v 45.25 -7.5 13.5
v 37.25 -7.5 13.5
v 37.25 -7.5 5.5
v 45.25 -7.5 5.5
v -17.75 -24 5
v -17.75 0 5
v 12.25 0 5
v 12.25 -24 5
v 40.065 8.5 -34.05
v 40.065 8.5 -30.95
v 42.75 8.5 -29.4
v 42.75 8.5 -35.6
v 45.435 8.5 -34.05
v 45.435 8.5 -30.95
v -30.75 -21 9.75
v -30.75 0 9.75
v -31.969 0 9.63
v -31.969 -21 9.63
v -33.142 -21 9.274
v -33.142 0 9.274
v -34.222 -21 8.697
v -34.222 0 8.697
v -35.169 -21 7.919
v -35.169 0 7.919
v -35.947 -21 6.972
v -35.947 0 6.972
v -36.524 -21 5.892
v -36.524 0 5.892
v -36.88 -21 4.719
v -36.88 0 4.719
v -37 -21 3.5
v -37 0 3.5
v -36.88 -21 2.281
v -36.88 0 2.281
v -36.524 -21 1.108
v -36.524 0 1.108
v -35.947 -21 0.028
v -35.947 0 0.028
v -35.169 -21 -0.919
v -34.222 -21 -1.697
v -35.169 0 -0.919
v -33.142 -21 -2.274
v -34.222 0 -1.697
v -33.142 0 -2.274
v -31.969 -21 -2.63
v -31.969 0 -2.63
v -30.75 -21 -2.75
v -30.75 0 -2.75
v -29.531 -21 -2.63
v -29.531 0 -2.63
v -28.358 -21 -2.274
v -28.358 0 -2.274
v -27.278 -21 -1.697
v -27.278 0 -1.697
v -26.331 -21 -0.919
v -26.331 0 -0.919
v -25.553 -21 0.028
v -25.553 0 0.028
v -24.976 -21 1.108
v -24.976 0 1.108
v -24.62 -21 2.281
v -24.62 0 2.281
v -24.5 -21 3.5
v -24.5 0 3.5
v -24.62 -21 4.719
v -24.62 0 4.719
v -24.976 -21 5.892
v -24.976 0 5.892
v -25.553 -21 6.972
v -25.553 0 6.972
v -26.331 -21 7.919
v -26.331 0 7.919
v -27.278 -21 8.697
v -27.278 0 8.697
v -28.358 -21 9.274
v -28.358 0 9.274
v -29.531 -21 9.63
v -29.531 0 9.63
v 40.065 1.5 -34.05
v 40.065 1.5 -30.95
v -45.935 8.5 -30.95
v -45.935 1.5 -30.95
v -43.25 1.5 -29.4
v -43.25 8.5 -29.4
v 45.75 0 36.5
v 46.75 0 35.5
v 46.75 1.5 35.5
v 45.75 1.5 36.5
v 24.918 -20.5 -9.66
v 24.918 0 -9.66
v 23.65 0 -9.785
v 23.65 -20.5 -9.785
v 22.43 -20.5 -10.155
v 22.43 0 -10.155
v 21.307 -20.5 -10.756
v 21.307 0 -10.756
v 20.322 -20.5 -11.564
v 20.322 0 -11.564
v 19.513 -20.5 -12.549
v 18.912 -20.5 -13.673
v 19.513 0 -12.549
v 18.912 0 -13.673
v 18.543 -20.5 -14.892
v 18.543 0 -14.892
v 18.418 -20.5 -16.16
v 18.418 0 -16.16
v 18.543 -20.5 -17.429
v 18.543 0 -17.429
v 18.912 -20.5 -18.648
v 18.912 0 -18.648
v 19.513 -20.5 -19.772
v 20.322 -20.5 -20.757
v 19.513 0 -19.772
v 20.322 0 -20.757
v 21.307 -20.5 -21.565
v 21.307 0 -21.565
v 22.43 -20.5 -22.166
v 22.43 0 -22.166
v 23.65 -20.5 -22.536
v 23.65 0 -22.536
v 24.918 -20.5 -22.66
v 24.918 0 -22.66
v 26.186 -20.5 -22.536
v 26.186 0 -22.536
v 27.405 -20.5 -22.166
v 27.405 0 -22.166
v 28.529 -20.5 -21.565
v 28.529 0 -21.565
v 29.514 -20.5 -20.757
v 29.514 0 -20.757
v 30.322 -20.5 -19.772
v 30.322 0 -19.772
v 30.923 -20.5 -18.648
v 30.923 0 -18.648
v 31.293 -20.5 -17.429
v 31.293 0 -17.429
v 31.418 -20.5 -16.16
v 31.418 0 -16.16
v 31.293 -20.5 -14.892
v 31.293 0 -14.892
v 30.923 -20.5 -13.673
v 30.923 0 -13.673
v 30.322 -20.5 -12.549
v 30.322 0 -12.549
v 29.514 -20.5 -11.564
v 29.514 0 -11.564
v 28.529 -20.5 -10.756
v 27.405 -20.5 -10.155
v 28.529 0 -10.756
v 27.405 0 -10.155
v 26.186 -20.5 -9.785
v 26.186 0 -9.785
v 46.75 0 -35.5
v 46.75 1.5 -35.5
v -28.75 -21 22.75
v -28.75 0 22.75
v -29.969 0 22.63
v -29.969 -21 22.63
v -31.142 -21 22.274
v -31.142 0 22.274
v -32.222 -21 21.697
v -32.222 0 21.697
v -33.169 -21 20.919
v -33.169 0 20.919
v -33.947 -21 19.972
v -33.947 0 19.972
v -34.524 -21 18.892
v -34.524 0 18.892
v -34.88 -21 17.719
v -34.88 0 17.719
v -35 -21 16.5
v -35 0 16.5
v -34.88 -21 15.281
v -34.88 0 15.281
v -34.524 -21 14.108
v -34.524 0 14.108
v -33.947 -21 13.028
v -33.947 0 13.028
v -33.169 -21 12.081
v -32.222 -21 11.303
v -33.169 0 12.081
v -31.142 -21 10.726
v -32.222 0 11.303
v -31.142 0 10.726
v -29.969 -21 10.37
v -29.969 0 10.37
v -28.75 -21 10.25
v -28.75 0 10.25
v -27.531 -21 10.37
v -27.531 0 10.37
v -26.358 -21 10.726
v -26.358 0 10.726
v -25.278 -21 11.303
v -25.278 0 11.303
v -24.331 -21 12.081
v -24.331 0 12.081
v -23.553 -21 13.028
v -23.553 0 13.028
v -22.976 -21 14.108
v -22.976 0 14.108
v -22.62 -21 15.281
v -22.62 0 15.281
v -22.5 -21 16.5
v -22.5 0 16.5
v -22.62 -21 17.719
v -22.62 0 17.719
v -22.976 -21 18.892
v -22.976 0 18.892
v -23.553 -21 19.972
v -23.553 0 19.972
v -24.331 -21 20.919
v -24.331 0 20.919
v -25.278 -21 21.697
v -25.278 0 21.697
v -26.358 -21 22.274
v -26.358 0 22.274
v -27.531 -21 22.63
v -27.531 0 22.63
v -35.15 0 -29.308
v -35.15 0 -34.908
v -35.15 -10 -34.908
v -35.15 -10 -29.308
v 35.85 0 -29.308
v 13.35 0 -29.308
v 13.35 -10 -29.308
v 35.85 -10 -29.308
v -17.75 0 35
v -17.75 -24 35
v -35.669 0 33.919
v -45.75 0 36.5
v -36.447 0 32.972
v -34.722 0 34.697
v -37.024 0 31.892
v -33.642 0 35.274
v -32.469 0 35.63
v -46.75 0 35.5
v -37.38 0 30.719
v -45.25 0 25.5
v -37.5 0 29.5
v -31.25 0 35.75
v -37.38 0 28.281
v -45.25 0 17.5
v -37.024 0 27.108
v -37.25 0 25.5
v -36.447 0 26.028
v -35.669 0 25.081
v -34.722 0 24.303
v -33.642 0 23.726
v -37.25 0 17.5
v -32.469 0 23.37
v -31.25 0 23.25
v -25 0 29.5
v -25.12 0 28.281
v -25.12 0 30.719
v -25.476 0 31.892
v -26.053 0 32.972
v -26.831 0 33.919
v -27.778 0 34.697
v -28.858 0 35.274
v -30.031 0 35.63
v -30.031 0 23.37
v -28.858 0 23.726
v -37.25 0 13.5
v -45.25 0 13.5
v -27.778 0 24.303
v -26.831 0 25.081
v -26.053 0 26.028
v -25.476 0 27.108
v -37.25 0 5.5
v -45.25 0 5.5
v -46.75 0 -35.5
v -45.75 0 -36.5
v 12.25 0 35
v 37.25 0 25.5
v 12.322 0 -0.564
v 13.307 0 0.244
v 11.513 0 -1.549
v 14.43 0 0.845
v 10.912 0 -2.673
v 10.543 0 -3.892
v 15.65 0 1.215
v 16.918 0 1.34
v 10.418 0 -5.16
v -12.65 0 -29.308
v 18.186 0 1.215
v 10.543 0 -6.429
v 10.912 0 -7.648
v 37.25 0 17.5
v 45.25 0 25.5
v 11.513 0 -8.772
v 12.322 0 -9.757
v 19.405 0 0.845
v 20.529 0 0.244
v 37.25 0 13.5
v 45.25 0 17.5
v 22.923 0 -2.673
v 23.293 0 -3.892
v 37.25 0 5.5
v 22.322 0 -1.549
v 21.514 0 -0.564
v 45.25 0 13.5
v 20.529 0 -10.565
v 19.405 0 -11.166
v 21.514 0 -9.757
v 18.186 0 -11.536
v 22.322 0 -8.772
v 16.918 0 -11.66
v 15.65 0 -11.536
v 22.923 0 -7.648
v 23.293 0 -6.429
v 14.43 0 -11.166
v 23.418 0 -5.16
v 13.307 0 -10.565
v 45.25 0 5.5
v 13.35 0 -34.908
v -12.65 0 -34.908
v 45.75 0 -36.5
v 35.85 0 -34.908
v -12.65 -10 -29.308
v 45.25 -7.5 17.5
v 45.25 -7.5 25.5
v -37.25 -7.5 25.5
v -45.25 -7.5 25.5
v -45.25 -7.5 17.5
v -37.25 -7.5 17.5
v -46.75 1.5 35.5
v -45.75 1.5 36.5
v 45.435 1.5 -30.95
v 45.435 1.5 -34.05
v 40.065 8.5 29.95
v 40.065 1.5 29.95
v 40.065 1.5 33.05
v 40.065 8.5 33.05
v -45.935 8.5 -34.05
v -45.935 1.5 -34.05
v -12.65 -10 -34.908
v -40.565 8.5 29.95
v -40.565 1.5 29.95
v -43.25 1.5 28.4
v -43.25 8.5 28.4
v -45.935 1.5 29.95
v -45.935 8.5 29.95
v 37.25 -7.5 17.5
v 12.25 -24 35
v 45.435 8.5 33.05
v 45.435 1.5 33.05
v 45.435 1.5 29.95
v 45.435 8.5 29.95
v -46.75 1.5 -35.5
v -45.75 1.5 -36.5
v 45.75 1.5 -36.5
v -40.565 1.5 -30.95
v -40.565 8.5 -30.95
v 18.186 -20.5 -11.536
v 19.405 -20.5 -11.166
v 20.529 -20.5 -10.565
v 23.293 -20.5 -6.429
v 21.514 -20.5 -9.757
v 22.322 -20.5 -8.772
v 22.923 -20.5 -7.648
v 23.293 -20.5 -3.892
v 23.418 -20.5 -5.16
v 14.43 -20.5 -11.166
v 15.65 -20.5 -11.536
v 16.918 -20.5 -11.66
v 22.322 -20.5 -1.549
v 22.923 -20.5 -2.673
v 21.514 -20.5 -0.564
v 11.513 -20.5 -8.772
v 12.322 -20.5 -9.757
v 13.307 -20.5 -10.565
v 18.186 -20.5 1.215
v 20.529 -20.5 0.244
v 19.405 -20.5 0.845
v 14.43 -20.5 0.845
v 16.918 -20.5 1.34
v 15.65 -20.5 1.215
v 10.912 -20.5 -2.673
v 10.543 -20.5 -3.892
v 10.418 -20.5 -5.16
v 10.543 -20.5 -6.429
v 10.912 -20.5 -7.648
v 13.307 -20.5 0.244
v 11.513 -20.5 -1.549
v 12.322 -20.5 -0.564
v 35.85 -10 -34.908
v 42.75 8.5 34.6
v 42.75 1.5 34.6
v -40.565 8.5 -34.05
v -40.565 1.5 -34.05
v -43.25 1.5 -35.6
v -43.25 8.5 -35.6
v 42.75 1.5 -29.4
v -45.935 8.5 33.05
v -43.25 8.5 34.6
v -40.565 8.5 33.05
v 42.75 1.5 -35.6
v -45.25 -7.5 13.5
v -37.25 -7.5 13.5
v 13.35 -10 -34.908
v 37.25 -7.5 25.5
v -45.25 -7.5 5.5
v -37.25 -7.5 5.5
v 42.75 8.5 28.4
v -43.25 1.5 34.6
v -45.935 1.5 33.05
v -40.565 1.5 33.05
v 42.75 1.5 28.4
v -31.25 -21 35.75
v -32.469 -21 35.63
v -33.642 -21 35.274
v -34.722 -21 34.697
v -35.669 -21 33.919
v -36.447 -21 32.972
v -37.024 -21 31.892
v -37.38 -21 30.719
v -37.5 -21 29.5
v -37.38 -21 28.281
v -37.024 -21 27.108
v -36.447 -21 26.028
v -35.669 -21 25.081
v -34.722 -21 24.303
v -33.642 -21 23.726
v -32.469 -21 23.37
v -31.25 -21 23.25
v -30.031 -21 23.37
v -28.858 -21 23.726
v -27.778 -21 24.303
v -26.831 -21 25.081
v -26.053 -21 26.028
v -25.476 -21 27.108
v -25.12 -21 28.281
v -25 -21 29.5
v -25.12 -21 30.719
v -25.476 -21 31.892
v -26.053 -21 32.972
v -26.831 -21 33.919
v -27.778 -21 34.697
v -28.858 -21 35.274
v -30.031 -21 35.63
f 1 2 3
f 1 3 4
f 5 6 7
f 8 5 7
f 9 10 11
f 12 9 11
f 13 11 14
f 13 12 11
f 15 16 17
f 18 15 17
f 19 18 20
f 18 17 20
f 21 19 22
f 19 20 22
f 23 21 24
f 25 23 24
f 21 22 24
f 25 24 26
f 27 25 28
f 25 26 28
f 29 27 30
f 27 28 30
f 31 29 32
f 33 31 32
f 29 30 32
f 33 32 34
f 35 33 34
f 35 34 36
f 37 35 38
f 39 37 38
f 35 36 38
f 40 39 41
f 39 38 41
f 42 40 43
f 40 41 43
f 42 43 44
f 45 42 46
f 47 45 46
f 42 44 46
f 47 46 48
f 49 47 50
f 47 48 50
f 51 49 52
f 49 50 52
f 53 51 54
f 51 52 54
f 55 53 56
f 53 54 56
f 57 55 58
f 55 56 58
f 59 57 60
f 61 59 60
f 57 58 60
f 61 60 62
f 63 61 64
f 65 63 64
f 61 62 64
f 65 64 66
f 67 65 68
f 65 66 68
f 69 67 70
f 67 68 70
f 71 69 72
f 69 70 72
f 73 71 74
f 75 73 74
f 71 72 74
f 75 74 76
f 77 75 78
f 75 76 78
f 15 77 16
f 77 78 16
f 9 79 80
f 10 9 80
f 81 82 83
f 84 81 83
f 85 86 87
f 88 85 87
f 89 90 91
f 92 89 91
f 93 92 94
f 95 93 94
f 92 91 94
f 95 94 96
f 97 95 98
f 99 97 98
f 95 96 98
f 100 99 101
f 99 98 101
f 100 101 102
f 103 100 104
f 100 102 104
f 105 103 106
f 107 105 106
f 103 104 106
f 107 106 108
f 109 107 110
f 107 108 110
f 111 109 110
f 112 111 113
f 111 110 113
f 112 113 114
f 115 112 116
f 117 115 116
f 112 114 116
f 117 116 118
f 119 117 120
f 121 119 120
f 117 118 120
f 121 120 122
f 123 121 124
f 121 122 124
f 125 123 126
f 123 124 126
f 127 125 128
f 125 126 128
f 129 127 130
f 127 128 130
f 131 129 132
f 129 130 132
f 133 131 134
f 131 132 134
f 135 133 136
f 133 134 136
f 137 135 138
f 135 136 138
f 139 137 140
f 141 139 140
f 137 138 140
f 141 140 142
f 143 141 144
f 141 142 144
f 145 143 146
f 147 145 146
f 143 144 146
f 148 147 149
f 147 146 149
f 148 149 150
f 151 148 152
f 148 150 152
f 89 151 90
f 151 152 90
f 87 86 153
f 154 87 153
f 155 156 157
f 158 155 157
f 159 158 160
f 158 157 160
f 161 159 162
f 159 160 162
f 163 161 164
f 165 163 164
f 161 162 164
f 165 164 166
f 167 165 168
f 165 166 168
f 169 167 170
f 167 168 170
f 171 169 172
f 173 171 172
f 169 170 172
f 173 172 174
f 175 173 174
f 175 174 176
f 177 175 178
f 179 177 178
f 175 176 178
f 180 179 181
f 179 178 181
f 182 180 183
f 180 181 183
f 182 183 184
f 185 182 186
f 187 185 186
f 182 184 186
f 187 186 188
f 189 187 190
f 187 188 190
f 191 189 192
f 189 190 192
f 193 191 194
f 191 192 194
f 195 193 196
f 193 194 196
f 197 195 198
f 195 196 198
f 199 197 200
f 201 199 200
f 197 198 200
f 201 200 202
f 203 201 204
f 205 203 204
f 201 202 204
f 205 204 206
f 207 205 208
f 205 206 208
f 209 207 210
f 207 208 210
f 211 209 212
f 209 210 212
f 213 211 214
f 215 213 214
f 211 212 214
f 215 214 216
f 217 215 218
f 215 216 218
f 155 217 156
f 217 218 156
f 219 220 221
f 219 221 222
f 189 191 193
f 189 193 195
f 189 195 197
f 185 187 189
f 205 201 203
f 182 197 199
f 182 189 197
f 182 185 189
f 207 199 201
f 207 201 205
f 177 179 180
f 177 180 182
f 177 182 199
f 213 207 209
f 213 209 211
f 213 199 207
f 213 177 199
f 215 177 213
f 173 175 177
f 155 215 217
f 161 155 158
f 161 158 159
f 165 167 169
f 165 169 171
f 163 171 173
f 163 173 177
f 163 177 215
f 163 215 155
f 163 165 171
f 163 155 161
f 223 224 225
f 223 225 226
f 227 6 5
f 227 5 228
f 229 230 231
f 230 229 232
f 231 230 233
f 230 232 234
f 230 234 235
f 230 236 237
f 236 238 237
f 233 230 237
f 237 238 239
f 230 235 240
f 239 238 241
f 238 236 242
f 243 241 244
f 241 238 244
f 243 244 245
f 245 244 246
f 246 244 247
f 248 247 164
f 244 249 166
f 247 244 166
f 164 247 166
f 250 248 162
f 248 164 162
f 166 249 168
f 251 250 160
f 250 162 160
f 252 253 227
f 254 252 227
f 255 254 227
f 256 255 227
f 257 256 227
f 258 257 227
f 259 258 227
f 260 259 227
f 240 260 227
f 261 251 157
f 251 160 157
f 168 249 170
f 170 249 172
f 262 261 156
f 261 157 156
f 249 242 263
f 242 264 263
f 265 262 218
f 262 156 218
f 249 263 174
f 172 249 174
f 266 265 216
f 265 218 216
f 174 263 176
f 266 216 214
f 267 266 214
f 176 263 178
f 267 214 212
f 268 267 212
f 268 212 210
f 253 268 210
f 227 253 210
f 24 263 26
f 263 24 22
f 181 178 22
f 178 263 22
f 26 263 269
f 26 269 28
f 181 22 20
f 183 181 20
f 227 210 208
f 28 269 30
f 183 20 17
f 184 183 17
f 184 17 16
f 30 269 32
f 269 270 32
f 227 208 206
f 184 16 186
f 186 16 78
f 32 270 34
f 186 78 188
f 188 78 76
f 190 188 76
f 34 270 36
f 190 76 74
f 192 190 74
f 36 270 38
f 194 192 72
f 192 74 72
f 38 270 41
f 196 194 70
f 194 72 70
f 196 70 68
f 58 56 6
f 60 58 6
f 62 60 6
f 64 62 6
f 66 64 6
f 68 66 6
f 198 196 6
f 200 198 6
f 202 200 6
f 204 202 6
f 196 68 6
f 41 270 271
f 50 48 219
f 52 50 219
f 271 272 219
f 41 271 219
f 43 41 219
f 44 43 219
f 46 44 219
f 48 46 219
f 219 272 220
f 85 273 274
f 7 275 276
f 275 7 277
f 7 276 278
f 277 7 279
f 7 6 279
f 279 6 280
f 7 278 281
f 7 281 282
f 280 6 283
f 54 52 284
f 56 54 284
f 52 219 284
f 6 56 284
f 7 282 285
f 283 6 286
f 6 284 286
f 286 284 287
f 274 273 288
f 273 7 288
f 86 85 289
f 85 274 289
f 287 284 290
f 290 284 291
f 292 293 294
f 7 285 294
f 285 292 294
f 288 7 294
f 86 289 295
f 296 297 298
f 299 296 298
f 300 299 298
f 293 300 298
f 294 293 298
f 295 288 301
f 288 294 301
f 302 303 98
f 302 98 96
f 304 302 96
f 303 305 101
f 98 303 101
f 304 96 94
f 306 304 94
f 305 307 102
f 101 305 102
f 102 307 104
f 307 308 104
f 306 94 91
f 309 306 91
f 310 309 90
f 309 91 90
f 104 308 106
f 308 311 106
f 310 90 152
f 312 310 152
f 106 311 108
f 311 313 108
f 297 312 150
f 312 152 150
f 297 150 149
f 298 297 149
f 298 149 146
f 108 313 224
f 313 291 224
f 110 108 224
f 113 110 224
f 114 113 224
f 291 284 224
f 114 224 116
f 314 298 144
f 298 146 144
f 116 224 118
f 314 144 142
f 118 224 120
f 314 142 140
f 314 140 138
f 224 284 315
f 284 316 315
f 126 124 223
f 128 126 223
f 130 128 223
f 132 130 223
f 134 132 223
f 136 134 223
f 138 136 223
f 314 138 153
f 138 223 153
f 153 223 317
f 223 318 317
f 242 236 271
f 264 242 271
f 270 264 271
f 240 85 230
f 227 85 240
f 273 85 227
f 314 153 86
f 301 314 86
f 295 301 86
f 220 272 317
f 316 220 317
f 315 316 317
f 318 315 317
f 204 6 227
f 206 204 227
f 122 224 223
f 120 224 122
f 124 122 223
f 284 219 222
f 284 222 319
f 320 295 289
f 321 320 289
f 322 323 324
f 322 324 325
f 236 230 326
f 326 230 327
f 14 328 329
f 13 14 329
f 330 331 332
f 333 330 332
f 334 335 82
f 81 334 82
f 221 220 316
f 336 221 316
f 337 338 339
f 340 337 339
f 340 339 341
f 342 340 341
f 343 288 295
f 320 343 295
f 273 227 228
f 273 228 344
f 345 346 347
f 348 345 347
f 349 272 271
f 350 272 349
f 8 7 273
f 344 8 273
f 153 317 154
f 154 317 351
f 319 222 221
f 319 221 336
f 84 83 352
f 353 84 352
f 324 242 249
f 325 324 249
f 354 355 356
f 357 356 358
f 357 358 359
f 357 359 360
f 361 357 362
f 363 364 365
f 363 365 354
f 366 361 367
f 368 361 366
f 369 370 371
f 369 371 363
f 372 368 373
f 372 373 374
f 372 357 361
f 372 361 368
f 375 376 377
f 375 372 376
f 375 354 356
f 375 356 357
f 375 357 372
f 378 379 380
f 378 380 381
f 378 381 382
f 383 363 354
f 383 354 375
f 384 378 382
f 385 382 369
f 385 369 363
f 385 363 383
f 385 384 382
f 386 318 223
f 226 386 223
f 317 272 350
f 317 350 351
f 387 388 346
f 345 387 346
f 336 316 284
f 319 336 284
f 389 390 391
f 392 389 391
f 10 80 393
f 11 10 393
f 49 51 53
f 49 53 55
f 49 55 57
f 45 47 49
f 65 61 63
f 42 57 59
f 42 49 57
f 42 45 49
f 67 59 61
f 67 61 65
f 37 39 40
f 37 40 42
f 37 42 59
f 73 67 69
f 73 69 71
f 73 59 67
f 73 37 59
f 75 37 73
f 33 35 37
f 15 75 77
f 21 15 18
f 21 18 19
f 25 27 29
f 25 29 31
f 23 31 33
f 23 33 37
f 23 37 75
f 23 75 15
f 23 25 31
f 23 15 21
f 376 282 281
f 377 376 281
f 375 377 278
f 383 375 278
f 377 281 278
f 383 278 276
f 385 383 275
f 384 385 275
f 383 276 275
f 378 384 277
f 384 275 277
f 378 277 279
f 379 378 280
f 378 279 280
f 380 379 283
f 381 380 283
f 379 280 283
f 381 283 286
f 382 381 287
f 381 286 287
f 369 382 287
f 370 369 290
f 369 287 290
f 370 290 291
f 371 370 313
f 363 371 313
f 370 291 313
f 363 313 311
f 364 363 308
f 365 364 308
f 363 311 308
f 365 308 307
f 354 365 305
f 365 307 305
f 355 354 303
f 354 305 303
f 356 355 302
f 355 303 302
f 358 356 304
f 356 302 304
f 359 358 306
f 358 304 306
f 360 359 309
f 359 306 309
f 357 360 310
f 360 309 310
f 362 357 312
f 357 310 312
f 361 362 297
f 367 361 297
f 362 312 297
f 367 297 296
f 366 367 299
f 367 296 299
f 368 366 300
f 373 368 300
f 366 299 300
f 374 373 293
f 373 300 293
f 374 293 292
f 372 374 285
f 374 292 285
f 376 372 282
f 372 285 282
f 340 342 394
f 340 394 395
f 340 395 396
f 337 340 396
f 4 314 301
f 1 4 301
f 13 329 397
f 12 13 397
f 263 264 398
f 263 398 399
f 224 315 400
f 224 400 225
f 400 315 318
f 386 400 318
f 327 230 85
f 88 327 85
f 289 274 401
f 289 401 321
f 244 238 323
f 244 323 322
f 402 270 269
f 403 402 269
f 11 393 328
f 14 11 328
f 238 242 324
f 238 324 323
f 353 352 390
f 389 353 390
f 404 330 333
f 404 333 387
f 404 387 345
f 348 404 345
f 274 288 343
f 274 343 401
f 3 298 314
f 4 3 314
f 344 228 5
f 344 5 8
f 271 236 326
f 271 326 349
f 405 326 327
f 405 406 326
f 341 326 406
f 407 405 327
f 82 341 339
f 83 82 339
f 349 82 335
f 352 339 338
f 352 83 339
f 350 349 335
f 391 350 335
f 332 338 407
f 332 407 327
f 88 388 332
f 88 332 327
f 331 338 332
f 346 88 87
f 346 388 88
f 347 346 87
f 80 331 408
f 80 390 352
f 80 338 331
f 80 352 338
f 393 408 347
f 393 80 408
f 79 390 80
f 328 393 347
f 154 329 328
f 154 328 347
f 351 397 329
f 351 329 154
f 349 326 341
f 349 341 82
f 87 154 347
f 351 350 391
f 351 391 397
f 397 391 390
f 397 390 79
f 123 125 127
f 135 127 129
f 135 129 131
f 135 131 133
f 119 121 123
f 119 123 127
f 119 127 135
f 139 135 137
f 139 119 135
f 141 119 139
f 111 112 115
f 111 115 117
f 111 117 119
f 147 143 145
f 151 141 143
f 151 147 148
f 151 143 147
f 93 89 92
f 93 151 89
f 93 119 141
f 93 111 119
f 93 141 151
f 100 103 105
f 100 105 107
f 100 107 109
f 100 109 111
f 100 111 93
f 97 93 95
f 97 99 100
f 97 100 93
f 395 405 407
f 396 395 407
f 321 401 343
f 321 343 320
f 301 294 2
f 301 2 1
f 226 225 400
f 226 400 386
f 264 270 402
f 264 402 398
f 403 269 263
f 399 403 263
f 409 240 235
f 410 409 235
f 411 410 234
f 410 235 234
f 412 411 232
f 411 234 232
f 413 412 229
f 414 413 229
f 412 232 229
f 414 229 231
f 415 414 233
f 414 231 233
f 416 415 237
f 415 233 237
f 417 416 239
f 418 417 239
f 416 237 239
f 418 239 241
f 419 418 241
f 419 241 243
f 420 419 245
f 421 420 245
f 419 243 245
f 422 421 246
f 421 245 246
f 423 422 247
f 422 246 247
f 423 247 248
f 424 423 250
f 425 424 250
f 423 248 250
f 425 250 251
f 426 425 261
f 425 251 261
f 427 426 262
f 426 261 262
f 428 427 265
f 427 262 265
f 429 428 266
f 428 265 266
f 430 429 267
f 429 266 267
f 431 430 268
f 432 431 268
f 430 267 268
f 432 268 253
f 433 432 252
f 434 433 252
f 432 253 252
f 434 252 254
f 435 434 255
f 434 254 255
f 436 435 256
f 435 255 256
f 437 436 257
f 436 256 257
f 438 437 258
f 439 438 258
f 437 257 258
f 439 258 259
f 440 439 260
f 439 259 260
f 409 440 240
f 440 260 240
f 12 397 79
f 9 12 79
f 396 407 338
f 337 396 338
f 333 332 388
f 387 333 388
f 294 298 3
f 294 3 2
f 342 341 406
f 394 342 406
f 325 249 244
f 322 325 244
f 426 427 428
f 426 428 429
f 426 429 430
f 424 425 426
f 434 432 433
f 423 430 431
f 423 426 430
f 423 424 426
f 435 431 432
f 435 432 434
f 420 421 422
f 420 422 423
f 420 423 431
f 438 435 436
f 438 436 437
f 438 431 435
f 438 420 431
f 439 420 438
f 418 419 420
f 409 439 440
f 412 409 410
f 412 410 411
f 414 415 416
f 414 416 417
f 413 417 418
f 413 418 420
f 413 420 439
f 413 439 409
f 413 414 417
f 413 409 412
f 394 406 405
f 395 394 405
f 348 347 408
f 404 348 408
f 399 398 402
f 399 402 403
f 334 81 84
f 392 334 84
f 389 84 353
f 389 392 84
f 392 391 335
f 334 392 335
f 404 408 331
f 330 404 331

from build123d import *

# Parameters (mm, degrees)
SKETCH_1_W       = 93.5
SKETCH_1_H       = 73
EXTRUDE_1_DEPTH  = 1.5
CHAMFER_1_SIZE   = 1
EXTRUDE_2_DEPTH  = 7
SKETCH_3_W       = 30
SKETCH_3_H       = 30
EXTRUDE_3_DEPTH  = 24
SKETCH_4_R       = 6.25
EXTRUDE_4_DEPTH  = 21
SKETCH_5_R       = 6.25
EXTRUDE_5_DEPTH  = 21
SKETCH_6_R       = 6.25
EXTRUDE_6_DEPTH  = 21
SKETCH_8_W       = 8
SKETCH_8_H       = 8
EXTRUDE_7_DEPTH  = 7.5
SKETCH_9_R       = 6.5
EXTRUDE_9_DEPTH  = 20.5
SKETCH_10_W      = 22.5
SKETCH_10_H      = 5.6
EXTRUDE_10_DEPTH = 10


with BuildPart() as part:
    # Эскиз1 → Бобышка-Вытянуть1 (new body)
    with BuildSketch(Plane(origin=(0, 0, 0), x_dir=(1, 0, 0), z_dir=(0, 1, 0))):
        Rectangle(SKETCH_1_W, SKETCH_1_H)
    extrude(amount=EXTRUDE_1_DEPTH)

    # Фаска1
    chamfer_1_edges = [part.edges().sort_by_distance(p)[0] for p in [
        (46.75, 0.75, 36.5),
        (-46.75, 0.75, 36.5),
        (-46.75, 0.75, -36.5),
        (46.75, 0.75, -36.5),
    ]]
    chamfer(chamfer_1_edges, length=CHAMFER_1_SIZE)

    # Эскиз2 → Бобышка-Вытянуть2 (add)
    with BuildSketch(Plane(origin=(0, 1.5, 0), x_dir=(1, 0, 0), z_dir=(0, 1, 0))):
        Polygon((42.75, 35.6), (40.065321248, 34.05), (40.065321248, 30.95), (42.75, 29.4), (45.434678752, 30.95), (45.434678752, 34.05), align=None)
        Polygon((-43.25, 35.6), (-45.934678752, 34.05), (-45.934678752, 30.95), (-43.25, 29.4), (-40.565321248, 30.95), (-40.565321248, 34.05), align=None)
        Polygon((42.75, -28.4), (40.065321248, -29.95), (40.065321248, -33.05), (42.75, -34.6), (45.434678752, -33.05), (45.434678752, -29.95), align=None)
        Polygon((-43.25, -28.4), (-45.934678752, -29.95), (-45.934678752, -33.05), (-43.25, -34.6), (-40.565321248, -33.05), (-40.565321248, -29.95), align=None)
    extrude(amount=EXTRUDE_2_DEPTH)

    # Эскиз3 → Бобышка-Вытянуть3 (add)
    with BuildSketch(Plane.XZ):
        with Locations((-2.75, 20)):
            Rectangle(SKETCH_3_W, SKETCH_3_H)
    extrude(amount=EXTRUDE_3_DEPTH)

    # Эскиз4 → Бобышка-Вытянуть4 (add)
    with BuildSketch(Plane.XZ):
        with Locations(Location((-31.25, 29.5, 0), (0, 0, 90))):
            Circle(SKETCH_4_R)
    extrude(amount=EXTRUDE_4_DEPTH)

    # Эскиз5 → Бобышка-Вытянуть5 (add)
    with BuildSketch(Plane.XZ):
        with Locations(Location((-28.75, 16.5, 0), (0, 0, 90))):
            Circle(SKETCH_5_R)
    extrude(amount=EXTRUDE_5_DEPTH)

    # Эскиз6 → Бобышка-Вытянуть6 (add)
    with BuildSketch(Plane.XZ):
        with Locations(Location((-30.75, 3.5, 0), (0, 0, 90))):
            Circle(SKETCH_6_R)
    extrude(amount=EXTRUDE_6_DEPTH)

    # Эскиз8 → Бобышка-Вытянуть7 (add)
    with BuildSketch(Plane.XZ):
        with Locations((-41.25, 21.5)):
            Rectangle(SKETCH_8_W, SKETCH_8_H)
        with Locations((-41.25, 9.5)):
            Rectangle(SKETCH_8_W, SKETCH_8_H)
        with Locations((41.25, 21.5)):
            Rectangle(SKETCH_8_W, SKETCH_8_H)
        with Locations((41.25, 9.5)):
            Rectangle(SKETCH_8_W, SKETCH_8_H)
    extrude(amount=EXTRUDE_7_DEPTH)

    # Эскиз9 → Бобышка-Вытянуть9 (add)
    with BuildSketch(Plane.XZ):
        with Locations(Location((16.917714538, -5.160483157, 0), (0, 0, 90))):
            Circle(SKETCH_9_R)
        with Locations(Location((24.917714538, -16.160483157, 0), (0, 0, 90))):
            Circle(SKETCH_9_R)
    extrude(amount=EXTRUDE_9_DEPTH)

    # Эскиз10 → Бобышка-Вытянуть10 (add)
    with BuildSketch(Plane.XZ):
        with Locations((-23.9, -32.107649626)):
            Rectangle(SKETCH_10_W, SKETCH_10_H)
        with Locations((24.6, -32.107649626)):
            Rectangle(SKETCH_10_W, SKETCH_10_H)
    extrude(amount=EXTRUDE_10_DEPTH)


solid = part.part
